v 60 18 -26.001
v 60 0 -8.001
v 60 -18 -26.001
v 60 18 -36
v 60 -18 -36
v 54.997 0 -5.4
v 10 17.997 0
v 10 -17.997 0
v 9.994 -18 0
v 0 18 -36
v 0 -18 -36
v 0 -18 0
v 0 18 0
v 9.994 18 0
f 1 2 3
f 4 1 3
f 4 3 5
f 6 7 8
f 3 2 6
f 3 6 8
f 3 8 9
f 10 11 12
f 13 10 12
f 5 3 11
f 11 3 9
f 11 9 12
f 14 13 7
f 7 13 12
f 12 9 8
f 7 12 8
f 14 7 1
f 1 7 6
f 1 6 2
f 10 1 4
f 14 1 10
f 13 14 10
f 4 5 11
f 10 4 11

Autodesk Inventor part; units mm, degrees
ref_plane "YZ Plane" through (0, 0, 0) normal (1, 0, 0) x (0, 1, 0)
ref_plane "XZ Plane" through (0, 0, 0) normal (0, 1, 0) x (-1, 0, 0)
sketch "草圖1" plane through (0, 0, 0) normal (0, 1, 0) x (-1, 0, 0)
  line L0 (0, 0) -> (-60, 0)
  line L1 (-60, 0) -> (-60, -36)
  line L2 (-60, -36) -> (0, -36)
  line L3 (0, -36) -> (0, 0)
  dimension "d0" = 60
  dimension "d1" = 36
extrude "擠出1" add sketch "草圖1" along normal mid plane 36
sketch "草圖2" plane through (0, 18, 0) normal (0, 1, 0) x (1, 0, 0)
  line L0 (0, 0) -> (60, 0) projected
  line L1 (10, 0) -> (60, 6)
  line L2 (60, 0) -> (60, 36) projected
  dimension "d4" = 10
  dimension "d5" = 30
extrude "擠出2" cut sketch "草圖2" against normal blind 40
sketch "草圖3" plane through (60, -18, -36) normal (1, 0, 0) x (0, 0, -1)
  line L0 (-30, 16) -> (-10, 36)
  line L1 (0, 36) -> (-36, 36) projected
  line L2 (-30, 36) -> (-30, 0) projected
  point P0 (-36, 18)
  dimension "d8" = 20
  dimension "d9" = 20
ref_plane "工作平面1" through (10, 18, 0) normal (-0.3451, -0.6637, -0.6637) x (0.8872, 0, -0.4614)
sketch "草圖4" plane through (10, 18, 0) normal (-0.3451, -0.6637, -0.6637) x (0.8872, 0, -0.4614)
  line L0 (-15.1543, -12.3218) -> (93.717, -12.3218)
  line L1 (93.717, -12.3218) -> (93.717, 28.8166)
  line L2 (93.717, 28.8166) -> (-15.1543, 28.8166)
  line L3 (-15.1543, 28.8166) -> (-15.1543, -12.3218)
  point P0 (-8.8722, 10.4027)
extrude "擠出3" cut sketch "草圖4" against normal blind 40
mirror "鏡射1" about plane through (0, 0, 0) normal (0, 1, 0) of "擠出3"
properties part number "3"
